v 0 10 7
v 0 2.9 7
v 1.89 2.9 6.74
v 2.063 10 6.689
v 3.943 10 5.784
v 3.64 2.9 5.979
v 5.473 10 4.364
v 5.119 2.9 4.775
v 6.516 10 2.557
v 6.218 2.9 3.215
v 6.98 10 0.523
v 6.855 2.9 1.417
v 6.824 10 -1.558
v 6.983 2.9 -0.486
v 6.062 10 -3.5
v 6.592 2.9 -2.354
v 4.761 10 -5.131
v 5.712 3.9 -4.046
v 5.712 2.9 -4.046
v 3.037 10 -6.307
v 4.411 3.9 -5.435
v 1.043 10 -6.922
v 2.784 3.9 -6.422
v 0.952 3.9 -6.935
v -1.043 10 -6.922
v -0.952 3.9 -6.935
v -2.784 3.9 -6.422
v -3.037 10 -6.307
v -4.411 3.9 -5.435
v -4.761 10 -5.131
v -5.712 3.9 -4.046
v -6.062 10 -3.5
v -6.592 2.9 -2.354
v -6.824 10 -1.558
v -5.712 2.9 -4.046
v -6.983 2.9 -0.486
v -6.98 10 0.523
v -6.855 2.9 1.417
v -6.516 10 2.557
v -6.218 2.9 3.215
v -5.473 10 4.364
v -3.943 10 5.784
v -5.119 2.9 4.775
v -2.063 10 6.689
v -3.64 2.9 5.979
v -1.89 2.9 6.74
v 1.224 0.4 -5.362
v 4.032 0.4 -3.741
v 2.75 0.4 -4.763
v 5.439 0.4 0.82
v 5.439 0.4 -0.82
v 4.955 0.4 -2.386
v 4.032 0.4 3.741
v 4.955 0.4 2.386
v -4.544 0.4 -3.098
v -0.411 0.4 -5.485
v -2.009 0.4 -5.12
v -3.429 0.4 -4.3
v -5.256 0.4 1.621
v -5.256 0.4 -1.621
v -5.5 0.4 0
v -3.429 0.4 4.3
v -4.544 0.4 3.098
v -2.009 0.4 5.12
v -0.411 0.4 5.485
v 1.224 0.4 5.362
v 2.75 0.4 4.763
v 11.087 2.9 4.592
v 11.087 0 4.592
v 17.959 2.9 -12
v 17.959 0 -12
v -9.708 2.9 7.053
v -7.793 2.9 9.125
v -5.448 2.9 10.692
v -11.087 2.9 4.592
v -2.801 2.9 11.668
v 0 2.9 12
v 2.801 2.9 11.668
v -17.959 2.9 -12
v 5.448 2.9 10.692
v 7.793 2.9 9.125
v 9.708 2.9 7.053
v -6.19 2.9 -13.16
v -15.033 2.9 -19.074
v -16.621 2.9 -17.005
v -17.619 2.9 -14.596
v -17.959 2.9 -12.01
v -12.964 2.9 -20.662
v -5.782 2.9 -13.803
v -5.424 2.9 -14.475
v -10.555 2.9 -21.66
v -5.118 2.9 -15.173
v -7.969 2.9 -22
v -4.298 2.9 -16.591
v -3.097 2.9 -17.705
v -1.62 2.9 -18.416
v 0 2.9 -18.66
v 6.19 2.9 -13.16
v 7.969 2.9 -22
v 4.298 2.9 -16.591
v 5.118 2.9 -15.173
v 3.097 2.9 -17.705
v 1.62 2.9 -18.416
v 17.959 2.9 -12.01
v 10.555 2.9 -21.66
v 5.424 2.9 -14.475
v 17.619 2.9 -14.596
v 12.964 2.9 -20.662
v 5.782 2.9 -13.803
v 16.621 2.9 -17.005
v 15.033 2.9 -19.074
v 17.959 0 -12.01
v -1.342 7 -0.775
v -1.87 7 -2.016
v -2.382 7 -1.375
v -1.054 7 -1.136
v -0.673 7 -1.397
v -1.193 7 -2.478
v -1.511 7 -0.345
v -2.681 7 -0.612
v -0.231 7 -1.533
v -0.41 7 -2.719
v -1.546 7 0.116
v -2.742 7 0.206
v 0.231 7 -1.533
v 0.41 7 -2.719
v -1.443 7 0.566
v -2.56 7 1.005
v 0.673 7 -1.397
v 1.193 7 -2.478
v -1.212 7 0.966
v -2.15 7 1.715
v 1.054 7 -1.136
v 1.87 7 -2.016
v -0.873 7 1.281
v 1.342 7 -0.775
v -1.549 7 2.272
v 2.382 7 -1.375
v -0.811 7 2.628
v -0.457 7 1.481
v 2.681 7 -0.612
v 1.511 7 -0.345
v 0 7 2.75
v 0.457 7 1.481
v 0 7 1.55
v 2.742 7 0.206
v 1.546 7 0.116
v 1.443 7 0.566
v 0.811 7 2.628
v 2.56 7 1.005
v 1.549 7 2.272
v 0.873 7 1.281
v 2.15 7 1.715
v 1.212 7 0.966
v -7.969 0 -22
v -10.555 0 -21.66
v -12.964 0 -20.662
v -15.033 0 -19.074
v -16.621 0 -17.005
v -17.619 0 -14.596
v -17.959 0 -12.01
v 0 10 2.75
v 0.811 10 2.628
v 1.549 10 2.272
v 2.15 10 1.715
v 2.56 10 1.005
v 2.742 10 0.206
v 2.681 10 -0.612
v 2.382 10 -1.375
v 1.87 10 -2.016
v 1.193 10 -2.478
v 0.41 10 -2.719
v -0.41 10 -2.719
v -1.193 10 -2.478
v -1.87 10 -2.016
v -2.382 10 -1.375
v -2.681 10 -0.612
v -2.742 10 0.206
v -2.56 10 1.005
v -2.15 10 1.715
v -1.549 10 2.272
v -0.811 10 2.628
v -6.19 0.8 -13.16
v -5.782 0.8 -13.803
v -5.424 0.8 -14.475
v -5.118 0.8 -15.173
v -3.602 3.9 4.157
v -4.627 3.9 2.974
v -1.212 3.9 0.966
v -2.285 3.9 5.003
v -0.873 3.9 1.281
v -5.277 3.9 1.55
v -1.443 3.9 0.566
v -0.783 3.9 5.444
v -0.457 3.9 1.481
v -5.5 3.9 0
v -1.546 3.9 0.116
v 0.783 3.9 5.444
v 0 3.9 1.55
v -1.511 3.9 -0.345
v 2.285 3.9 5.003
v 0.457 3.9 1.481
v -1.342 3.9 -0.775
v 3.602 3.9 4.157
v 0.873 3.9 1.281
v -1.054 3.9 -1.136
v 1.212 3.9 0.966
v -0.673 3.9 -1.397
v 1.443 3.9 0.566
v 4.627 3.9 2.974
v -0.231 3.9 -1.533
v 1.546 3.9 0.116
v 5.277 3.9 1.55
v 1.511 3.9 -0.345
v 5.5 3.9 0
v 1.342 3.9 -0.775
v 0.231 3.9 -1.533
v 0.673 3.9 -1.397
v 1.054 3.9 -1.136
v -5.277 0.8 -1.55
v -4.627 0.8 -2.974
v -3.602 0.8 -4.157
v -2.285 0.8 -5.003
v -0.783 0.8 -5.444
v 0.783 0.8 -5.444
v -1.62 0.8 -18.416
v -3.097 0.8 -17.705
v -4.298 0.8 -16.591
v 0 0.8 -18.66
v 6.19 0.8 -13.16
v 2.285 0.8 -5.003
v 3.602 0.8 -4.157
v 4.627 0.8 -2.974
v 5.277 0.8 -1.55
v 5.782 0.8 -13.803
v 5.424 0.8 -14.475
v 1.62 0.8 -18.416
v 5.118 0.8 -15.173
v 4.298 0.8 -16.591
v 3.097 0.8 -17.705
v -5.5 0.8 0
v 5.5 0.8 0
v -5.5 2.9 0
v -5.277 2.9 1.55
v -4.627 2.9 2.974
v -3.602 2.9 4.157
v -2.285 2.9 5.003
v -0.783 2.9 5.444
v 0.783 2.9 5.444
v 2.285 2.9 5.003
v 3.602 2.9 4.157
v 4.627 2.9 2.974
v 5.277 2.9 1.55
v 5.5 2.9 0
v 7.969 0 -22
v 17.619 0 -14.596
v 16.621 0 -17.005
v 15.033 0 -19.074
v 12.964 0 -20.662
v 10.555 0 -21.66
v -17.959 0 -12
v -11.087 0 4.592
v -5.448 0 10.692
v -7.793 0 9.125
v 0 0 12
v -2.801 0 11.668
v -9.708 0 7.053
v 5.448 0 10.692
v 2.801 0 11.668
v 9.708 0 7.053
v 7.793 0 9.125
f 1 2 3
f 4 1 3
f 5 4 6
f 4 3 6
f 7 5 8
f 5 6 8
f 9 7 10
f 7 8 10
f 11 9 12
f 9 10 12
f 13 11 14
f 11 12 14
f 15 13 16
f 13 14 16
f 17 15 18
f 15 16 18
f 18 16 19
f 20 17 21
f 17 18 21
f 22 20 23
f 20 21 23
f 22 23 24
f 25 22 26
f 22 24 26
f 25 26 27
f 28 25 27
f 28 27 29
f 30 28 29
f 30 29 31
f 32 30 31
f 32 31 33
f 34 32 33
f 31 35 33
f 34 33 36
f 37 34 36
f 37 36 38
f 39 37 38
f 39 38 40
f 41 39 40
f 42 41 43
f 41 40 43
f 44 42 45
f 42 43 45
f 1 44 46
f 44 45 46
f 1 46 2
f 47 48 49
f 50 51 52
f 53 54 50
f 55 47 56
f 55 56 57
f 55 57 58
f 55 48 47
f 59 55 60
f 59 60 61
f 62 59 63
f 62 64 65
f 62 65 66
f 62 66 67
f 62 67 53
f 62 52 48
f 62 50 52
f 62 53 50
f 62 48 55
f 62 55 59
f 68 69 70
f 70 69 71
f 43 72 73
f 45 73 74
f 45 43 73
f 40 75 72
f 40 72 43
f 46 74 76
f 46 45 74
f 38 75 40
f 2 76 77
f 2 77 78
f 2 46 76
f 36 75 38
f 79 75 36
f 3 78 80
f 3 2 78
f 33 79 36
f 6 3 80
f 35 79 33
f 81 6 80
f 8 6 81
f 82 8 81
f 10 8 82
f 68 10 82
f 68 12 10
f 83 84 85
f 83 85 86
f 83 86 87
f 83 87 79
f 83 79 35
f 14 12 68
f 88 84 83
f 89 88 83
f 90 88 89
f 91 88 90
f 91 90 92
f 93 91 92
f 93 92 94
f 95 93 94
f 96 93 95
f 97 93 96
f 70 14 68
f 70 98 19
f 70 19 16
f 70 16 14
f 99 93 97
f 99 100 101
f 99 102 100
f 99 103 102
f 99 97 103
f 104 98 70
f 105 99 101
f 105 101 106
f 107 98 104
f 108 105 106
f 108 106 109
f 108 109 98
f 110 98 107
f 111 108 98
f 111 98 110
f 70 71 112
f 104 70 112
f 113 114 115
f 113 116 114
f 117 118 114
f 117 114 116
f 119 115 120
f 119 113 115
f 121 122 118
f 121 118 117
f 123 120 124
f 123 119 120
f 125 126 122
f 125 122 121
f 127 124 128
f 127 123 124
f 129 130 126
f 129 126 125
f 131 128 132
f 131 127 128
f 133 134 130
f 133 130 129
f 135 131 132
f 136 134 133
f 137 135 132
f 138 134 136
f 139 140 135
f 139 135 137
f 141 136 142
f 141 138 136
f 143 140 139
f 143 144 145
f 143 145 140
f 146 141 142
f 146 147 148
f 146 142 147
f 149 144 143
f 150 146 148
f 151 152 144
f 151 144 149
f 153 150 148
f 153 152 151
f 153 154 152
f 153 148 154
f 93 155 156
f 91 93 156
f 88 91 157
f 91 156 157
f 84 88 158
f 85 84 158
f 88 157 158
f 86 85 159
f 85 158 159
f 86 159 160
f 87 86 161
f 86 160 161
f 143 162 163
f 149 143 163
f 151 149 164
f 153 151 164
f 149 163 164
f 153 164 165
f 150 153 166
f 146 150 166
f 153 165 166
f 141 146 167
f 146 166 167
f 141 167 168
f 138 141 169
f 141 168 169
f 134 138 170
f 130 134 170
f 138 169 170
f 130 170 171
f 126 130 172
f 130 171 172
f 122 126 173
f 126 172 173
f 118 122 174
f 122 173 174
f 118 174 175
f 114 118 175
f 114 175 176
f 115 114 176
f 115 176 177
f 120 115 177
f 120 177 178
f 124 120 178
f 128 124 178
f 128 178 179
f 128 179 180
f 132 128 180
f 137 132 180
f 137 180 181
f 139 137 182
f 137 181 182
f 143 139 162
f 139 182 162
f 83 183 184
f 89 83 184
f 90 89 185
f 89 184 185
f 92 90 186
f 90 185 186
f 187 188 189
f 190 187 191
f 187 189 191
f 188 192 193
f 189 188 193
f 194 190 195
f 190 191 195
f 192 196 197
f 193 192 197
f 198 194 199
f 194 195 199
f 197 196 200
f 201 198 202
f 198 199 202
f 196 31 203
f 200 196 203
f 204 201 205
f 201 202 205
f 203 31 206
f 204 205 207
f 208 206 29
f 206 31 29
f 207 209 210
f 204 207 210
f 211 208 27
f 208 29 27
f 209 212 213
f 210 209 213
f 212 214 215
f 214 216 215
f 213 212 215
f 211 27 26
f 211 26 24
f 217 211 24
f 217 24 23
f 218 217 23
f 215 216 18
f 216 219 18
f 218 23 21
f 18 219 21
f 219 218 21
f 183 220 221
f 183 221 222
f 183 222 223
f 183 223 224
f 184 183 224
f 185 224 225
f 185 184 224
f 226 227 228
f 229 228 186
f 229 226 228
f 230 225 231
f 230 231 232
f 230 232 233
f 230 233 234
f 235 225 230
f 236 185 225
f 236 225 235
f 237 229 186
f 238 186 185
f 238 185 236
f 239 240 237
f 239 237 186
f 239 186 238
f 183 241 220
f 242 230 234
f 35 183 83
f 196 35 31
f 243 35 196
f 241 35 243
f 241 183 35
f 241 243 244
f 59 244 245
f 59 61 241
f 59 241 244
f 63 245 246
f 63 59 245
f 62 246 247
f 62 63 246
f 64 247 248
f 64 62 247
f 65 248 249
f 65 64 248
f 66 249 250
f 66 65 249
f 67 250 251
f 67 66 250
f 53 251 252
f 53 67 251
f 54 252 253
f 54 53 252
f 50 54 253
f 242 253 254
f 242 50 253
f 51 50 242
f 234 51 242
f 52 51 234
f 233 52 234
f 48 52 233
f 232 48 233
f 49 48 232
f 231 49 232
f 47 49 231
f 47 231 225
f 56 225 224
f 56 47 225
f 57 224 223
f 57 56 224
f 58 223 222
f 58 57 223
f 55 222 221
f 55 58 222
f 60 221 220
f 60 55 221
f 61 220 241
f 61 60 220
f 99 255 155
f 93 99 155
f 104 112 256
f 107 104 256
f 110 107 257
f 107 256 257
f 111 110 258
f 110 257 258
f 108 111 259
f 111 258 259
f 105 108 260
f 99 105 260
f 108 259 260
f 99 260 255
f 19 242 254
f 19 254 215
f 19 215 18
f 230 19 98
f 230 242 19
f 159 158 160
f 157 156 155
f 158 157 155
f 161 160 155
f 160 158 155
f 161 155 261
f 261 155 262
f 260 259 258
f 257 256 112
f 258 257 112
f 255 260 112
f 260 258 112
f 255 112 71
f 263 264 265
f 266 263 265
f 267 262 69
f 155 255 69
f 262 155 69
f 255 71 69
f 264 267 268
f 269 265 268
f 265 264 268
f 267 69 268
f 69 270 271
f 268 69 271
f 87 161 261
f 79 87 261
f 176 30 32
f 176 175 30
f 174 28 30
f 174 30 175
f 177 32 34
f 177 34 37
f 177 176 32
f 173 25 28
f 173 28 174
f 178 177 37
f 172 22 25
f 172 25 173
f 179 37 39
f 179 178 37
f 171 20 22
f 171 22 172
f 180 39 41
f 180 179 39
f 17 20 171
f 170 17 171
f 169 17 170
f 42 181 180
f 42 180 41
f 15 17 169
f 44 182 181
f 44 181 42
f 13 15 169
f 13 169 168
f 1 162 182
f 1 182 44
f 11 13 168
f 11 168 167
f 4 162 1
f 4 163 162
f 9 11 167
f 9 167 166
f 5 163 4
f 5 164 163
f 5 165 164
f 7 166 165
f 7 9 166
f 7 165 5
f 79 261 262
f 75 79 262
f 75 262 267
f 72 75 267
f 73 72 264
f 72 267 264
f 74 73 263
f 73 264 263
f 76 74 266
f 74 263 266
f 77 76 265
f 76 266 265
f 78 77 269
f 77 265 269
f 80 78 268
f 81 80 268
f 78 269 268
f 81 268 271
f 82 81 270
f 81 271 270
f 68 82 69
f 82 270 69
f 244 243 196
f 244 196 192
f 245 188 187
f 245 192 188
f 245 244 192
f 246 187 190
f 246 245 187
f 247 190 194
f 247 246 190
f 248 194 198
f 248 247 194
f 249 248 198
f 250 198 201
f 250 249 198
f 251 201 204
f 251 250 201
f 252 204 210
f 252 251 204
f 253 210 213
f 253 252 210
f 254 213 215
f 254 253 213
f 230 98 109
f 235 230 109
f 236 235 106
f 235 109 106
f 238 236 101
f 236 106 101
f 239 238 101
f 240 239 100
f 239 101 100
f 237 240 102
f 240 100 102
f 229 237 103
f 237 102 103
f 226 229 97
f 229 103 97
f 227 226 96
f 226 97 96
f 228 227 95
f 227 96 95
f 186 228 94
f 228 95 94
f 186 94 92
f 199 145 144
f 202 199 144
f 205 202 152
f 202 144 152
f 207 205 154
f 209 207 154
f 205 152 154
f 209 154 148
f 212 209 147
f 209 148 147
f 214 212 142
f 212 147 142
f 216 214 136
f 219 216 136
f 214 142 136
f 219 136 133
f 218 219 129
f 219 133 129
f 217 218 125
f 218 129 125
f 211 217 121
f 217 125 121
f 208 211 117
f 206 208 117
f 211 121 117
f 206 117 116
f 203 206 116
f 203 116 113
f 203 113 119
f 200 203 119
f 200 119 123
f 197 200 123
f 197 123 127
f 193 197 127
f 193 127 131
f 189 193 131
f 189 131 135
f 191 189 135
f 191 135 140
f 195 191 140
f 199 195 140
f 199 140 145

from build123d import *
from build123d.topology import SkipClean

# Parameters (mm, degrees)
SKETCH1_R           = 12
SKETCH1_R_2         = 7
SKETCH1_R_3         = 5.5
BOSS_EXTRUDE1_DEPTH = 2.9
SKETCH1_3_R         = 7
SKETCH1_3_R_2       = 5.5
BOSS_EXTRUDE2_DEPTH = 10
SKETCH2_R           = 5.5
CUT_EXTRUDE2_DEPTH  = 1
SKETCH3_R           = 5.5
CUT_EXTRUDE3_DEPTH  = 1
CUT_EXTRUDE4_START  = -2.5
SKETCH3_4_R         = 5.5
CUT_EXTRUDE4_DEPTH  = 2.5
CUT_EXTRUDE6_REACH  = 32.109
SKETCH5_R           = 1.55
CUT_EXTRUDE7_START  = -2.1
CUT_EXTRUDE7_DEPTH  = 2.1
SKETCH6_R           = 5.5
CUT_EXTRUDE8_DEPTH  = 2.1
FILLET1_R           = 10
SKETCH5_3_R         = 2.75
SKETCH5_3_R_2       = 1.55
CUT_EXTRUDE9_DEPTH  = 3


with BuildPart() as part:
    # Sketch1 → Boss-Extrude1 (new body)
    # profile 1 of 4: a face of its own
    with BuildSketch(Plane(origin=(0, 0, 0), x_dir=(1, 0, 0), z_dir=(0, 1, 0))):
        Circle(SKETCH1_R)
        Circle(SKETCH1_R_2, mode=Mode.SUBTRACT)
    # profile 2 of 4: a face of its own
    with BuildSketch(Plane(origin=(0, 0, 0), x_dir=(1, 0, 0), z_dir=(0, 1, 0))):
        with BuildLine():
            ThreePointArc((12, -2.94e-15), (11.769423369196444, -2.341083842286014), (11.086554407231223, -4.592201147108209))
            Line((11.086554407231223, -4.592201147108209), (17.959269151985882, 12))
            Line((17.959269151985882, 12), (17.959269151985882, 12.009999999999998))
            ThreePointArc((17.959269151985882, 12.009999999999998), (15.033265896039495, 19.07399674405361), (7.969269151985883, 21.999999999999996))
            Line((7.969269151985883, 21.999999999999996), (-7.969269151985883, 21.999999999999996))
            ThreePointArc((-7.969269151985883, 21.999999999999993), (-15.033265896039492, 19.07399674405361), (-17.959269151985882, 12.009999999999998))
            Line((-17.959269151985882, 12.009999999999998), (-17.959269151985882, 12))
            Line((-17.95926915198589, 12.000000000000014), (-11.086554257092926, -4.592201509574117))
            ThreePointArc((-11.08655425709292, -4.592201509574119), (-2.3410840346818973, 11.769423330926521), (12, 0))
        make_face()
    # profile 3 of 4: a face of its own
    with BuildSketch(Plane(origin=(0, 0, 0), x_dir=(1, 0, 0), z_dir=(0, 1, 0))):
        Circle(SKETCH1_R_2)
    # profile 4 of 4: a face of its own
    with BuildSketch(Plane(origin=(0, 0, 0), x_dir=(1, 0, 0), z_dir=(0, 1, 0))):
        Circle(SKETCH1_R_3)
    extrude(amount=BOSS_EXTRUDE1_DEPTH)

    # Sketch1<3> → Boss-Extrude2 (add)
    with BuildSketch(Plane(origin=(0, 0, 0), x_dir=(1, 0, 0), z_dir=(0, 1, 0))):
        with Locations(Location((0, 0, 0), (0, 0, 270))):
            Circle(SKETCH1_3_R)
        Circle(SKETCH1_3_R_2)
    extrude(amount=BOSS_EXTRUDE2_DEPTH)

    # Sketch2 → Cut-Extrude2 (cut)
    with SkipClean():  # the faces are left unmerged after this step: merging them gives an invalid solid
        with BuildSketch(Plane(origin=(0, 2.9, 0), x_dir=(1, 0, 0), z_dir=(0, 1, 0))):
            with BuildLine():
                ThreePointArc((-5.500000000000162, 4.330127018921988), (-1.9852e-13, 7), (5.499999999999917, 4.330127018922298))
                Line((5.5, 4.330127018922322), (5.5, 11.712224753227023))
                Line((5.5, 11.712224753227023), (-5.5, 11.712224753227023))
                Line((-5.5, 11.712224753227023), (-5.5, 4.330127018921939))
            make_face()
            with Locations(Location((0, 0, 0), (0, 0, 270))):
                Circle(SKETCH2_R)
        extrude(amount=CUT_EXTRUDE2_DEPTH, mode=Mode.SUBTRACT)

    # Sketch3 → Cut-Extrude3 (cut)
    with BuildSketch(Plane(origin=(0, 2.9, 0), x_dir=(1, 0, 0), z_dir=(0, 1, 0))):
        Circle(SKETCH3_R)
        with BuildLine():
            ThreePointArc((-5.5, 3.12e-15), (1.56e-15, 5.5), (5.5, 0))
            Line((5.5, 0), (6.1896702982743115, 13.159693230837554))
            Line((6.1896702982743115, 13.159693230837554), (-6.189670298274319, 13.159693230837554))
            Line((-6.1896702982743195, 13.159693230837554), (-5.5, 0))
        make_face()
    extrude(amount=CUT_EXTRUDE3_DEPTH, mode=Mode.SUBTRACT)

    # Sketch3<4> → Cut-Extrude4 (cut)
    with SkipClean():  # the faces are left unmerged after this step: merging them gives an invalid solid
        with BuildSketch(Plane(origin=(0, 2.9, 0), x_dir=(1, 0, 0), z_dir=(0, 1, 0)).offset(CUT_EXTRUDE4_START)):
            with Locations(Location((0, 0, 0), (0, 0, 180))):
                Circle(SKETCH3_4_R)
        extrude(amount=CUT_EXTRUDE4_DEPTH, mode=Mode.SUBTRACT)

    # Sketch5 → Cut-Extrude6 (cut, up to next)
    with BuildSketch(Plane(origin=(0, 10, 0), x_dir=(1, 0, 0), z_dir=(0, 1, 0)), mode=Mode.PRIVATE) as cut_extrude6_sk1:
        with Locations(Location((0, 0, 0), (0, 0, 270))):
            Circle(SKETCH5_R)
    cut_extrude6_tool1 = extrude(cut_extrude6_sk1.sketch, amount=-CUT_EXTRUDE6_REACH, mode=Mode.PRIVATE) & part.part
    add(cut_extrude6_tool1.solids().sort_by_distance((0, 10, 0))[0], mode=Mode.SUBTRACT)

    # Sketch3<5> → Cut-Extrude7 (cut)
    with BuildSketch(Plane(origin=(0, 2.9, 0), x_dir=(1, 0, 0), z_dir=(0, 1, 0)).offset(CUT_EXTRUDE7_START)):
        with BuildLine():
            ThreePointArc((-5.5, 3.12e-15), (1.56e-15, 5.5), (5.5, 0))
            Line((5.5, 0), (6.1896702982743115, 13.159693230837554))
            Line((6.1896702982743115, 13.159693230837554), (-6.189670298274319, 13.159693230837554))
            Line((-6.1896702982743195, 13.159693230837554), (-5.5, 0))
        make_face()
    extrude(amount=CUT_EXTRUDE7_DEPTH, mode=Mode.SUBTRACT)

    # Sketch6 → Cut-Extrude8 (cut)
    with BuildSketch(Plane(origin=(0, 2.9, 0), x_dir=(1, 0, 0), z_dir=(0, 1, 0))):
        with Locations((-4.34e-15, 13.159693230837554)):
            Circle(SKETCH6_R)
    extrude(amount=-CUT_EXTRUDE8_DEPTH, mode=Mode.SUBTRACT)

    # Fillet1
    # the kernel refuses this fillet: 10 mm, written as the material it takes off along each edge
    with BuildSketch(Plane(origin=(5.499999999999996, 8.022933245127838, -13.159693230837554), x_dir=(1, 0, 0), z_dir=(0, -1, 0))) as fillet1_piece_1:
        with BuildLine():
            CenterArc((8.924194649844473, -5.6738530738289406), FILLET1_R, 145.43190419239474, 13.095569895078825)
            ThreePointArc((-0.3817373823132515, -2.01330270361672), (-0.09627700574515341, -1.0245866490255686), (0, 0))
            Line((0, 0), (0.6896702982743177, 0))
        make_face()
    extrude(amount=7.222933245127838, mode=Mode.SUBTRACT)
    with BuildSketch(Plane(origin=(-5.500000000000004, 0.7999999999999998, -13.159693230837554), x_dir=(0.18628848164101172, 0, -0.9824950898645174), z_dir=(0, 1, 0))) as fillet1_piece_2:
        with BuildLine():
            CenterArc((3.9120581144612516, 9.824950898645172), FILLET1_R, 246.168167148658, 13.095569895078825)
            Line((-0.12847763269842533, 0.6775976816799091), (0, 0))
            ThreePointArc((0, 0), (1.0245866490255648, 0.09627700574515353), (2.0491732980511315, -1e-17))
        make_face()
    extrude(amount=7.222933245127831, mode=Mode.SUBTRACT)

    # Sketch5<3> → Cut-Extrude9 (cut)
    with BuildSketch(Plane(origin=(0, 10, 0), x_dir=(1, 0, 0), z_dir=(0, 1, 0))):
        with Locations(Location((0, 0, 0), (0, 0, 270))):
            Circle(SKETCH5_3_R)
        with Locations(Location((0, 0, 0), (0, 0, 270))):
            Circle(SKETCH5_3_R_2, mode=Mode.SUBTRACT)
    extrude(amount=-CUT_EXTRUDE9_DEPTH, mode=Mode.SUBTRACT)


solid = part.part
